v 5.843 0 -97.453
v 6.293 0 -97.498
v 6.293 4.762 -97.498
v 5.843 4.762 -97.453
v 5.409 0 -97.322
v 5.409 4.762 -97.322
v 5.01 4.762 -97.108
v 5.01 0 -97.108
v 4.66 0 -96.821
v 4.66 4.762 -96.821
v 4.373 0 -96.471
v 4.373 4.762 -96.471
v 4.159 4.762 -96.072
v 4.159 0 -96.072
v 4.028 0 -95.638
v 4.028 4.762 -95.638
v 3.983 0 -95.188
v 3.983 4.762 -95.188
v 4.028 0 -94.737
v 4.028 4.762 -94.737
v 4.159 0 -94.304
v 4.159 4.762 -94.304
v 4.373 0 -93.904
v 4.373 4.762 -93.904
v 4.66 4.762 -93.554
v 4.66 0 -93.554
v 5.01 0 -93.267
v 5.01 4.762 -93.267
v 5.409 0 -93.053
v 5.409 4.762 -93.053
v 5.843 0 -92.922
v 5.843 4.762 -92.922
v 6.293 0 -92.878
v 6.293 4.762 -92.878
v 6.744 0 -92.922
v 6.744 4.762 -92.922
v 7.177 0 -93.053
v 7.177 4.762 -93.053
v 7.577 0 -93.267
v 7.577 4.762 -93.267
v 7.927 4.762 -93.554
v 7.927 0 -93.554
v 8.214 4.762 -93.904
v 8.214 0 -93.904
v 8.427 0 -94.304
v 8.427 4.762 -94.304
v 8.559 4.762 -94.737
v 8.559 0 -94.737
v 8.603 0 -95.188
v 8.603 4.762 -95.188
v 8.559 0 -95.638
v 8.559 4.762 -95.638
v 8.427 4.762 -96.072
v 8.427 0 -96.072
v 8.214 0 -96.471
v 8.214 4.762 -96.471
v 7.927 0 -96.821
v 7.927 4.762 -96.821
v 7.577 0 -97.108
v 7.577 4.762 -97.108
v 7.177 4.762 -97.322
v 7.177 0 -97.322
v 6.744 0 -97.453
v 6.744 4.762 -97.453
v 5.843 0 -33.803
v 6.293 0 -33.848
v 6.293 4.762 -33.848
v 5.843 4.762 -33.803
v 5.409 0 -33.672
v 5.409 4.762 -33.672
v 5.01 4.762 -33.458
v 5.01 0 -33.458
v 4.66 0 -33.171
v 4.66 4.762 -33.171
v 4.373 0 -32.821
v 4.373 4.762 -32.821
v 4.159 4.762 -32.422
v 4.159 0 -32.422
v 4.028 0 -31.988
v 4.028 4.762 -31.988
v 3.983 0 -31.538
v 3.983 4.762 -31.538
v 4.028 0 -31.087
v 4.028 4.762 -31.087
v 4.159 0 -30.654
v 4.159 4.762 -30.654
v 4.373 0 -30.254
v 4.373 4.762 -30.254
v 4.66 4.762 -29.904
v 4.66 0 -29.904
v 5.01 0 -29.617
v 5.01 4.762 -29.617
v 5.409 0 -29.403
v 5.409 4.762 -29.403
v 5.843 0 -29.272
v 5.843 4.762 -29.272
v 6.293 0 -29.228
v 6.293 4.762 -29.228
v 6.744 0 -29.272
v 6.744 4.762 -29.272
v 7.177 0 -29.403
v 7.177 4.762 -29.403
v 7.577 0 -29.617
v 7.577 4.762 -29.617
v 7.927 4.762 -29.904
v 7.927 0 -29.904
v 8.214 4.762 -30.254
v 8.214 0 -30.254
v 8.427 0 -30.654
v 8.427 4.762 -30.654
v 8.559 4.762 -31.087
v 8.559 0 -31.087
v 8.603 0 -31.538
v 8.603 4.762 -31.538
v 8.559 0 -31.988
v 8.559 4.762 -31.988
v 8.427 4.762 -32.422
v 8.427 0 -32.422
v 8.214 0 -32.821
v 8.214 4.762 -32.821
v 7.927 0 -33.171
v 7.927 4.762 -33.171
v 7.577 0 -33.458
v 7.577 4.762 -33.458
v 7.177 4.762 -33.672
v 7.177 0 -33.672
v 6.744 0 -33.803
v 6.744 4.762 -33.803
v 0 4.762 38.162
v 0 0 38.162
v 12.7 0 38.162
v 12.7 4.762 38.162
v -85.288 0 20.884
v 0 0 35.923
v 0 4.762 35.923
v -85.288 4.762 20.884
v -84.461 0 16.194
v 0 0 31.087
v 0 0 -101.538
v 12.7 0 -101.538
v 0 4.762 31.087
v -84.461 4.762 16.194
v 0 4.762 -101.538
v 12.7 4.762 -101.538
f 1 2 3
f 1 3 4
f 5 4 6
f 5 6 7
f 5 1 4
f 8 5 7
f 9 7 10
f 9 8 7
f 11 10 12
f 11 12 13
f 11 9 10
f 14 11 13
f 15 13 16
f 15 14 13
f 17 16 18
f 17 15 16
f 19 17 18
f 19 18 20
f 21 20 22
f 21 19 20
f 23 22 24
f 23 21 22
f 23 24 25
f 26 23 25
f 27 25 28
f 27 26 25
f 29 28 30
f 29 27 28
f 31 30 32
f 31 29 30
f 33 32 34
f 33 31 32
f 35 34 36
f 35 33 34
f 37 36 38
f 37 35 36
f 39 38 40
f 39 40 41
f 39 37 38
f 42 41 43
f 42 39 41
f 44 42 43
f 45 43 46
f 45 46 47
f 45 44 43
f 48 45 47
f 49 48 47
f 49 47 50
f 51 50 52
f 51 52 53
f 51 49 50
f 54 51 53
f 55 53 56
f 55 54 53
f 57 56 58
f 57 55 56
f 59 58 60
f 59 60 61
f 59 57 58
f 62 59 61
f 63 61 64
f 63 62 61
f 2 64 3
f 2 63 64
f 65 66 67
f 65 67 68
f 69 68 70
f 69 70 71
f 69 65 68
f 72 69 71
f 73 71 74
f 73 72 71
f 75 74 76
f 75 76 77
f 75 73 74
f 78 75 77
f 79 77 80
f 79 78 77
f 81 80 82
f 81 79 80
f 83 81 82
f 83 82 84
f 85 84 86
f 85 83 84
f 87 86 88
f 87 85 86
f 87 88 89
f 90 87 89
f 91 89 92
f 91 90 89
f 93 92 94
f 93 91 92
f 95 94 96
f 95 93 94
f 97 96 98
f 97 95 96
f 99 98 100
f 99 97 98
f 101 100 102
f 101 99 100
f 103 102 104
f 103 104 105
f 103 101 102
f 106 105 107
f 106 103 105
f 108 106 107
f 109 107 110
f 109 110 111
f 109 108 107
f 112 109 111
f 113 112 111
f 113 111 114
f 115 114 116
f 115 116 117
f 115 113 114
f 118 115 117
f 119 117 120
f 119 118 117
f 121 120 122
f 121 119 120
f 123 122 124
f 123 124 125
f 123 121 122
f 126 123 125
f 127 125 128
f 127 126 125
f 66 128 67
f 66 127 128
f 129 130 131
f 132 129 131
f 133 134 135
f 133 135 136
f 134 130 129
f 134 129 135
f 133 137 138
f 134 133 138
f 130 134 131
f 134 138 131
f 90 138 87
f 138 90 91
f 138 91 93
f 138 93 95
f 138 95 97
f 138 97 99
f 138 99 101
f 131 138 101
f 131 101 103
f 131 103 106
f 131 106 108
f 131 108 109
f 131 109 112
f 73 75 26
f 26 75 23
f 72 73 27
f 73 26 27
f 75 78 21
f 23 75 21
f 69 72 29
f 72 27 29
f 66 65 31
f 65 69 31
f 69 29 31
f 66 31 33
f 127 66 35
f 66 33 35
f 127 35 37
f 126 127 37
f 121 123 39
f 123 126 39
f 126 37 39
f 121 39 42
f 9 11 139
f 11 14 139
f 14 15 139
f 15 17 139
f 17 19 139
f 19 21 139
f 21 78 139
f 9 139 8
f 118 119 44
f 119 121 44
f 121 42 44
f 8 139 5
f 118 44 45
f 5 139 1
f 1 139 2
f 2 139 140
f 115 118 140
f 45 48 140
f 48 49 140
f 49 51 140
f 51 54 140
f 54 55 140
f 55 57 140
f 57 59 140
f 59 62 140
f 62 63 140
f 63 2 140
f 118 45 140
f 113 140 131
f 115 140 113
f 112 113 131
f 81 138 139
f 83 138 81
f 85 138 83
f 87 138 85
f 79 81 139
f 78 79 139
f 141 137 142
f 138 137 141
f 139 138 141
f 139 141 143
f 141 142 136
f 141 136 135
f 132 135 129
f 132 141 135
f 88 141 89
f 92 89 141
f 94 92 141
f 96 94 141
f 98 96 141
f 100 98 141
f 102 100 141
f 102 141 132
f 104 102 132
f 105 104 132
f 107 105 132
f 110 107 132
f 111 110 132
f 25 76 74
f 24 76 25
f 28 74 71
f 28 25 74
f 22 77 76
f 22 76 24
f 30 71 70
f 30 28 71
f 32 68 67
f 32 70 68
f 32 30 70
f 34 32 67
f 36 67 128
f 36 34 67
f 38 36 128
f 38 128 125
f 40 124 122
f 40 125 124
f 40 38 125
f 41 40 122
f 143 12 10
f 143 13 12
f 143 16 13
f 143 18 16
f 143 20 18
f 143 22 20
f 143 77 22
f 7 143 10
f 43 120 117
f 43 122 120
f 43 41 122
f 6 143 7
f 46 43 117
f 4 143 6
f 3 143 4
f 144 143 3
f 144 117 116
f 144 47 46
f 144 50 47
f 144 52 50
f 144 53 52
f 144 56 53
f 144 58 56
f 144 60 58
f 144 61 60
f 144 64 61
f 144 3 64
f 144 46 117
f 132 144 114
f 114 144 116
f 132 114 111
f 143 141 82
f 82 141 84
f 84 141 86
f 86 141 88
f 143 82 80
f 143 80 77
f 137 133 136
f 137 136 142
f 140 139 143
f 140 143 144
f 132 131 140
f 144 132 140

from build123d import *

# Parameters (mm, degrees)
SKETCH1_W           = 12.7
SKETCH1_H           = 139.7
SKETCH1_R           = 2.31
BOSS_EXTRUDE1_DEPTH = 4.7625
BOSS_EXTRUDE2_DEPTH = 4.7625


with BuildPart() as part:
    # Sketch1 → Boss-Extrude1 (new body)
    with BuildSketch(Plane(origin=(0, 0, 0), x_dir=(1, 0, 0), z_dir=(0, 1, 0))):
        with Locations((6.35, 31.687542426)):
            Rectangle(SKETCH1_W, SKETCH1_H)
        with Locations(Location((6.293214881, 95.187542426, 0), (0, 0, 90))):
            Circle(SKETCH1_R, mode=Mode.SUBTRACT)
        with Locations(Location((6.293214881, 31.537542426, 0), (0, 0, 90))):
            Circle(SKETCH1_R, mode=Mode.SUBTRACT)
    extrude(amount=BOSS_EXTRUDE1_DEPTH)

    # Sketch2 → Boss-Extrude2 (add)
    with BuildSketch(Plane.XZ):
        Polygon((0, 31.08713568), (0, 35.923104919), (-85.288371425, 20.884463896), (-84.461371979, 16.194316973), align=None)
    extrude(amount=-BOSS_EXTRUDE2_DEPTH)


solid = part.part
